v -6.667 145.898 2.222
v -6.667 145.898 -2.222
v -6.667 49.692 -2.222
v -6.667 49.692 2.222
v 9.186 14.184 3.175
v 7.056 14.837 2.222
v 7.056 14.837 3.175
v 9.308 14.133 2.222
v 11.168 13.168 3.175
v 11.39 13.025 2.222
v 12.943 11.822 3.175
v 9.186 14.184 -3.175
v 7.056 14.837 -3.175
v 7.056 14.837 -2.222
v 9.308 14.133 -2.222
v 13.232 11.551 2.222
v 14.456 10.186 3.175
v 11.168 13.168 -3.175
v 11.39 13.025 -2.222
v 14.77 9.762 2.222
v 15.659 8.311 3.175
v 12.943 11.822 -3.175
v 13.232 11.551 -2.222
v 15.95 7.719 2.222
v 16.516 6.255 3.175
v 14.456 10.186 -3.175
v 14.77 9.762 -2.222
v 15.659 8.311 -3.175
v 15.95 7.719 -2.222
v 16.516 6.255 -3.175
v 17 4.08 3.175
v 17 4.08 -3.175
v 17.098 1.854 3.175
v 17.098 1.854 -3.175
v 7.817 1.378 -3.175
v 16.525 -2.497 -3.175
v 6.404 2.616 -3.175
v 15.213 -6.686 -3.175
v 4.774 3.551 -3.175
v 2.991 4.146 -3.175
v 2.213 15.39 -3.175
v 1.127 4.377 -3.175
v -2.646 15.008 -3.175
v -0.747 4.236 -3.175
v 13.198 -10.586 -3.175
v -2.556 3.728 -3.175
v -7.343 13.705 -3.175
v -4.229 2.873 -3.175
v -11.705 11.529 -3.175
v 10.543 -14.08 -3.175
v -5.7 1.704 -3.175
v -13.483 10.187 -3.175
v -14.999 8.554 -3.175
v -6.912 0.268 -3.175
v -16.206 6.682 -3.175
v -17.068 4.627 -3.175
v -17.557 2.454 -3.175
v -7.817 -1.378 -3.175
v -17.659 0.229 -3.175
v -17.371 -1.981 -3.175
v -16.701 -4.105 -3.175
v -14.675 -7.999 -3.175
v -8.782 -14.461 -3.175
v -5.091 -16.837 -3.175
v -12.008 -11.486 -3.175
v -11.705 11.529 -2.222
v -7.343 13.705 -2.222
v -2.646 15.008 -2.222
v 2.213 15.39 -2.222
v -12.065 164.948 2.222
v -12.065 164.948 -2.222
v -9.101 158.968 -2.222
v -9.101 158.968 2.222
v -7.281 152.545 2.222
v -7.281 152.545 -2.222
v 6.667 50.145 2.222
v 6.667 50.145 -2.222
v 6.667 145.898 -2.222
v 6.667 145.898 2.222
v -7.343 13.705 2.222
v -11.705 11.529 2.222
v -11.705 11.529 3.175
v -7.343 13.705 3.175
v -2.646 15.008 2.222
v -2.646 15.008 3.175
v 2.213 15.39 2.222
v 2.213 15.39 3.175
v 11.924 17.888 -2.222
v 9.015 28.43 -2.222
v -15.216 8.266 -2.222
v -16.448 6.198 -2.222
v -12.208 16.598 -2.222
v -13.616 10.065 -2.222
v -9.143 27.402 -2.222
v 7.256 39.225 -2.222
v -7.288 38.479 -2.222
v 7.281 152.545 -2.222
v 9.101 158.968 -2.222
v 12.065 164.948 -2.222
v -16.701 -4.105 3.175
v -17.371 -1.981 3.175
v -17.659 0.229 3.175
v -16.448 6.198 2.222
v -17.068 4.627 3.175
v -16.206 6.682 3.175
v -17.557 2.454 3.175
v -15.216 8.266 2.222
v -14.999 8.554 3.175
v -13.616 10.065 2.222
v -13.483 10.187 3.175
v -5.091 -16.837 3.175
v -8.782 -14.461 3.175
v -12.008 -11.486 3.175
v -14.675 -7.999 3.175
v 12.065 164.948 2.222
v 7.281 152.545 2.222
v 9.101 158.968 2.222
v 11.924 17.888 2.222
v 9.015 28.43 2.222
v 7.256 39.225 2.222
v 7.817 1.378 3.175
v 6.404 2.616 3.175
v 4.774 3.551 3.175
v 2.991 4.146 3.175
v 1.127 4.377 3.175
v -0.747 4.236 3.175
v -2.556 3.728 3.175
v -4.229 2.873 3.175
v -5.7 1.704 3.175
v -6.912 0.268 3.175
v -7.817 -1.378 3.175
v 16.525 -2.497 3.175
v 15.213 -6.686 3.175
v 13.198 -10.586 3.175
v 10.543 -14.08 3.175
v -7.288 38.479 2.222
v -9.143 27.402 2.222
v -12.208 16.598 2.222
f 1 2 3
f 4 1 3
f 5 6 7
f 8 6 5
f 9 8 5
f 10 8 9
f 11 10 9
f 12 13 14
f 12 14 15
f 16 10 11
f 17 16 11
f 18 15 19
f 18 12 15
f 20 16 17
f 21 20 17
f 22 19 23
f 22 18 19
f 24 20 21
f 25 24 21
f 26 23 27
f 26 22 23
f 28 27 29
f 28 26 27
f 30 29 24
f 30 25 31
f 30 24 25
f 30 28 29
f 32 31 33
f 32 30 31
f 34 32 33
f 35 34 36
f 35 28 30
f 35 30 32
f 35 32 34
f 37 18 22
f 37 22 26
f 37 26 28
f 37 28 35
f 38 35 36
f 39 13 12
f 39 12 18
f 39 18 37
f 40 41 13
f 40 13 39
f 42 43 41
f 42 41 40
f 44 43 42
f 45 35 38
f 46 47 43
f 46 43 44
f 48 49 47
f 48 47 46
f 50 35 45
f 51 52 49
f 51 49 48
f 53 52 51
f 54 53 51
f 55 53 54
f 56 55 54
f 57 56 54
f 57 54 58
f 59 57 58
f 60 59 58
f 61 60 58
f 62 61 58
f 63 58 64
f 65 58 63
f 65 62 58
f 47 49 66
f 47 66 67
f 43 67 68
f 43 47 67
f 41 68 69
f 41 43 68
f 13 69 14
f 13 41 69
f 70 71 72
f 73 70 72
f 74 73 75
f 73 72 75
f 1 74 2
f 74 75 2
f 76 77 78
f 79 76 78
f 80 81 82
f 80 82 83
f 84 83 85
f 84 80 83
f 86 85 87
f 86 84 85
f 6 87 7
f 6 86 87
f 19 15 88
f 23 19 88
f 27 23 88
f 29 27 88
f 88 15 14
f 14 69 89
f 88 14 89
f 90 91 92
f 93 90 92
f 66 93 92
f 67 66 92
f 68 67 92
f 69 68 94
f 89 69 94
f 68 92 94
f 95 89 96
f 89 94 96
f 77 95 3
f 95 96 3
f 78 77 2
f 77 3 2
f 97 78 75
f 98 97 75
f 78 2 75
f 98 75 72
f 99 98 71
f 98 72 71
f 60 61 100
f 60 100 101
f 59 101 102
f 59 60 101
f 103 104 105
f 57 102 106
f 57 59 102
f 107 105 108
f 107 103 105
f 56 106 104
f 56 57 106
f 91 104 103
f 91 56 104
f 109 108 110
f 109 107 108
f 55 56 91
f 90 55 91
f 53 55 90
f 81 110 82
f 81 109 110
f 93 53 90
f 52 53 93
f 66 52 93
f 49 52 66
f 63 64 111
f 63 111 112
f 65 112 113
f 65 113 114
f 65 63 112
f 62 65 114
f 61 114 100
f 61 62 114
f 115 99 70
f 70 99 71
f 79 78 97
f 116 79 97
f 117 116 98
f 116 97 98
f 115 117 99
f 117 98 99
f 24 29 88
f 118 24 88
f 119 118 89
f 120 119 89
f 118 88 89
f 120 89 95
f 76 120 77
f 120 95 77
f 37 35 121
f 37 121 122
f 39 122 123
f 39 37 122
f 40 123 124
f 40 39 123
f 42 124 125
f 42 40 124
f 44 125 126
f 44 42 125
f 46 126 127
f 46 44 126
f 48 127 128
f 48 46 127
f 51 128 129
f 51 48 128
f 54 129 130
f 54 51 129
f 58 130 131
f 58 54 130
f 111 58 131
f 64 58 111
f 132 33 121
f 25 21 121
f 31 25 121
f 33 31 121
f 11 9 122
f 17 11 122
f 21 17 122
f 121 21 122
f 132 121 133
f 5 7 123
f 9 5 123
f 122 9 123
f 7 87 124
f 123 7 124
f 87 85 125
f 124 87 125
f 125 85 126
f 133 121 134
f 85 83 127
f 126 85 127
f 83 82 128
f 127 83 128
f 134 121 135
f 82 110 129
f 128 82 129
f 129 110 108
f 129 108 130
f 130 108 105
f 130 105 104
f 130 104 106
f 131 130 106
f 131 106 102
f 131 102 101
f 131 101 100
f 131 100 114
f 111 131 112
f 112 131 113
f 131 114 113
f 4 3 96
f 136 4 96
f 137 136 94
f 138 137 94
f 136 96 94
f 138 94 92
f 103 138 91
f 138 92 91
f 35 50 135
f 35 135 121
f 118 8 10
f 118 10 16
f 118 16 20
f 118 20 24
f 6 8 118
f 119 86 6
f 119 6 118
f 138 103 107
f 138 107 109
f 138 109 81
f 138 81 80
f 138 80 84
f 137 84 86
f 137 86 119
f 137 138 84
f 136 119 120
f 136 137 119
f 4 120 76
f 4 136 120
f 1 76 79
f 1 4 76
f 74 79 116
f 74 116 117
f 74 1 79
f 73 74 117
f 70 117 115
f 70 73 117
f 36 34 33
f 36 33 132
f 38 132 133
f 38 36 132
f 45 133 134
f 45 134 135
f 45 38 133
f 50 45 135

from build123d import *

# Parameters (mm, degrees)
HEAD_EXTRUDE_DEPTH        = 3.175
HEAD_EXTRUDE_DEPTH_BACK   = 3.175
HANDLE_EXTRUDE_DEPTH      = 2.2225
HANDLE_EXTRUDE_DEPTH_BACK = 2.2225


with BuildPart() as part:
    # head + handle sketch → head extrude (new, two sides: drawn at the far end of the back side and taken through both)
    with BuildSketch(Plane(origin=(0, 0, 0), x_dir=(0, 1, 0), z_dir=(0, 0, 1)).offset(-HEAD_EXTRUDE_DEPTH_BACK)):
        with BuildLine():
            Line((-16.837056671, 5.091121365), (-1.37833241, 7.81691154))
            ThreePointArc((-1.37833241, 7.81691154), (4.236175861, 0.746952099), (1.37833241, -7.81691154))
            Line((1.37833241, -7.81691154), (-14.08039185, -10.542701714))
            ThreePointArc((-14.08039185, -10.542701714), (-6.685826637, -15.212601851), (1.854333587, -17.097601941))
            ThreePointArc((1.854333587, -17.097601941), (4.855139843, -16.873528347), (7.718992867, -15.94973561))
            ThreePointArc((7.718992867, -15.94973561), (12.331168475, -12.345606251), (14.837059135, -7.055764638))
            ThreePointArc((14.837059135, -7.055764638), (15.008470156, 2.646398228), (11.52906135, 11.704823057))
            ThreePointArc((11.52906135, 11.704823057), (9.203666438, 14.458341062), (6.198407098, 16.44774781))
            ThreePointArc((6.198407098, 16.44774781), (1.073408159, 17.666453114), (-4.105220678, 16.700709816))
            ThreePointArc((-4.105220678, 16.700709816), (-11.48563822, 12.008482318), (-16.837056671, 5.091121365))
        make_face()
    extrude(amount=HEAD_EXTRUDE_DEPTH + HEAD_EXTRUDE_DEPTH_BACK)

    # Sketch2<3> → handle extrude (add, two sides: drawn at the far end of the back side and taken through both)
    with BuildSketch(Plane(origin=(0, 0, 0), x_dir=(0, 1, 0), z_dir=(0, 0, 1)).offset(-HANDLE_EXTRUDE_DEPTH_BACK)):
        with BuildLine():
            ThreePointArc((49.692005566, 6.6675), (27.402174057, 9.142712932), (6.198407098, 16.44774781))
            ThreePointArc((6.198407098, 16.44774781), (9.203666438, 14.458341062), (11.52906135, 11.704823057))
            ThreePointArc((11.52906135, 11.704823057), (15.008470156, 2.646398228), (14.837059135, -7.055764638))
            ThreePointArc((14.837059135, -7.055764638), (12.331168475, -12.345606251), (7.718992867, -15.94973561))
            ThreePointArc((7.718992867, -15.94973561), (28.430370524, -9.015182994), (50.145286343, -6.6675))
            Line((50.145286343, -6.6675), (145.898407098, -6.6675))
            ThreePointArc((145.898407098, -6.6675), (155.798350359, -8.042920845), (164.948407098, -12.065))
            Line((164.948407098, -12.065), (164.948407098, 12.065))
            ThreePointArc((164.948407098, 12.065), (155.798350359, 8.042920845), (145.898407098, 6.6675))
            Line((145.898407098, 6.6675), (49.692005566, 6.6675))
        make_face()
    extrude(amount=HANDLE_EXTRUDE_DEPTH + HANDLE_EXTRUDE_DEPTH_BACK)


solid = part.part
